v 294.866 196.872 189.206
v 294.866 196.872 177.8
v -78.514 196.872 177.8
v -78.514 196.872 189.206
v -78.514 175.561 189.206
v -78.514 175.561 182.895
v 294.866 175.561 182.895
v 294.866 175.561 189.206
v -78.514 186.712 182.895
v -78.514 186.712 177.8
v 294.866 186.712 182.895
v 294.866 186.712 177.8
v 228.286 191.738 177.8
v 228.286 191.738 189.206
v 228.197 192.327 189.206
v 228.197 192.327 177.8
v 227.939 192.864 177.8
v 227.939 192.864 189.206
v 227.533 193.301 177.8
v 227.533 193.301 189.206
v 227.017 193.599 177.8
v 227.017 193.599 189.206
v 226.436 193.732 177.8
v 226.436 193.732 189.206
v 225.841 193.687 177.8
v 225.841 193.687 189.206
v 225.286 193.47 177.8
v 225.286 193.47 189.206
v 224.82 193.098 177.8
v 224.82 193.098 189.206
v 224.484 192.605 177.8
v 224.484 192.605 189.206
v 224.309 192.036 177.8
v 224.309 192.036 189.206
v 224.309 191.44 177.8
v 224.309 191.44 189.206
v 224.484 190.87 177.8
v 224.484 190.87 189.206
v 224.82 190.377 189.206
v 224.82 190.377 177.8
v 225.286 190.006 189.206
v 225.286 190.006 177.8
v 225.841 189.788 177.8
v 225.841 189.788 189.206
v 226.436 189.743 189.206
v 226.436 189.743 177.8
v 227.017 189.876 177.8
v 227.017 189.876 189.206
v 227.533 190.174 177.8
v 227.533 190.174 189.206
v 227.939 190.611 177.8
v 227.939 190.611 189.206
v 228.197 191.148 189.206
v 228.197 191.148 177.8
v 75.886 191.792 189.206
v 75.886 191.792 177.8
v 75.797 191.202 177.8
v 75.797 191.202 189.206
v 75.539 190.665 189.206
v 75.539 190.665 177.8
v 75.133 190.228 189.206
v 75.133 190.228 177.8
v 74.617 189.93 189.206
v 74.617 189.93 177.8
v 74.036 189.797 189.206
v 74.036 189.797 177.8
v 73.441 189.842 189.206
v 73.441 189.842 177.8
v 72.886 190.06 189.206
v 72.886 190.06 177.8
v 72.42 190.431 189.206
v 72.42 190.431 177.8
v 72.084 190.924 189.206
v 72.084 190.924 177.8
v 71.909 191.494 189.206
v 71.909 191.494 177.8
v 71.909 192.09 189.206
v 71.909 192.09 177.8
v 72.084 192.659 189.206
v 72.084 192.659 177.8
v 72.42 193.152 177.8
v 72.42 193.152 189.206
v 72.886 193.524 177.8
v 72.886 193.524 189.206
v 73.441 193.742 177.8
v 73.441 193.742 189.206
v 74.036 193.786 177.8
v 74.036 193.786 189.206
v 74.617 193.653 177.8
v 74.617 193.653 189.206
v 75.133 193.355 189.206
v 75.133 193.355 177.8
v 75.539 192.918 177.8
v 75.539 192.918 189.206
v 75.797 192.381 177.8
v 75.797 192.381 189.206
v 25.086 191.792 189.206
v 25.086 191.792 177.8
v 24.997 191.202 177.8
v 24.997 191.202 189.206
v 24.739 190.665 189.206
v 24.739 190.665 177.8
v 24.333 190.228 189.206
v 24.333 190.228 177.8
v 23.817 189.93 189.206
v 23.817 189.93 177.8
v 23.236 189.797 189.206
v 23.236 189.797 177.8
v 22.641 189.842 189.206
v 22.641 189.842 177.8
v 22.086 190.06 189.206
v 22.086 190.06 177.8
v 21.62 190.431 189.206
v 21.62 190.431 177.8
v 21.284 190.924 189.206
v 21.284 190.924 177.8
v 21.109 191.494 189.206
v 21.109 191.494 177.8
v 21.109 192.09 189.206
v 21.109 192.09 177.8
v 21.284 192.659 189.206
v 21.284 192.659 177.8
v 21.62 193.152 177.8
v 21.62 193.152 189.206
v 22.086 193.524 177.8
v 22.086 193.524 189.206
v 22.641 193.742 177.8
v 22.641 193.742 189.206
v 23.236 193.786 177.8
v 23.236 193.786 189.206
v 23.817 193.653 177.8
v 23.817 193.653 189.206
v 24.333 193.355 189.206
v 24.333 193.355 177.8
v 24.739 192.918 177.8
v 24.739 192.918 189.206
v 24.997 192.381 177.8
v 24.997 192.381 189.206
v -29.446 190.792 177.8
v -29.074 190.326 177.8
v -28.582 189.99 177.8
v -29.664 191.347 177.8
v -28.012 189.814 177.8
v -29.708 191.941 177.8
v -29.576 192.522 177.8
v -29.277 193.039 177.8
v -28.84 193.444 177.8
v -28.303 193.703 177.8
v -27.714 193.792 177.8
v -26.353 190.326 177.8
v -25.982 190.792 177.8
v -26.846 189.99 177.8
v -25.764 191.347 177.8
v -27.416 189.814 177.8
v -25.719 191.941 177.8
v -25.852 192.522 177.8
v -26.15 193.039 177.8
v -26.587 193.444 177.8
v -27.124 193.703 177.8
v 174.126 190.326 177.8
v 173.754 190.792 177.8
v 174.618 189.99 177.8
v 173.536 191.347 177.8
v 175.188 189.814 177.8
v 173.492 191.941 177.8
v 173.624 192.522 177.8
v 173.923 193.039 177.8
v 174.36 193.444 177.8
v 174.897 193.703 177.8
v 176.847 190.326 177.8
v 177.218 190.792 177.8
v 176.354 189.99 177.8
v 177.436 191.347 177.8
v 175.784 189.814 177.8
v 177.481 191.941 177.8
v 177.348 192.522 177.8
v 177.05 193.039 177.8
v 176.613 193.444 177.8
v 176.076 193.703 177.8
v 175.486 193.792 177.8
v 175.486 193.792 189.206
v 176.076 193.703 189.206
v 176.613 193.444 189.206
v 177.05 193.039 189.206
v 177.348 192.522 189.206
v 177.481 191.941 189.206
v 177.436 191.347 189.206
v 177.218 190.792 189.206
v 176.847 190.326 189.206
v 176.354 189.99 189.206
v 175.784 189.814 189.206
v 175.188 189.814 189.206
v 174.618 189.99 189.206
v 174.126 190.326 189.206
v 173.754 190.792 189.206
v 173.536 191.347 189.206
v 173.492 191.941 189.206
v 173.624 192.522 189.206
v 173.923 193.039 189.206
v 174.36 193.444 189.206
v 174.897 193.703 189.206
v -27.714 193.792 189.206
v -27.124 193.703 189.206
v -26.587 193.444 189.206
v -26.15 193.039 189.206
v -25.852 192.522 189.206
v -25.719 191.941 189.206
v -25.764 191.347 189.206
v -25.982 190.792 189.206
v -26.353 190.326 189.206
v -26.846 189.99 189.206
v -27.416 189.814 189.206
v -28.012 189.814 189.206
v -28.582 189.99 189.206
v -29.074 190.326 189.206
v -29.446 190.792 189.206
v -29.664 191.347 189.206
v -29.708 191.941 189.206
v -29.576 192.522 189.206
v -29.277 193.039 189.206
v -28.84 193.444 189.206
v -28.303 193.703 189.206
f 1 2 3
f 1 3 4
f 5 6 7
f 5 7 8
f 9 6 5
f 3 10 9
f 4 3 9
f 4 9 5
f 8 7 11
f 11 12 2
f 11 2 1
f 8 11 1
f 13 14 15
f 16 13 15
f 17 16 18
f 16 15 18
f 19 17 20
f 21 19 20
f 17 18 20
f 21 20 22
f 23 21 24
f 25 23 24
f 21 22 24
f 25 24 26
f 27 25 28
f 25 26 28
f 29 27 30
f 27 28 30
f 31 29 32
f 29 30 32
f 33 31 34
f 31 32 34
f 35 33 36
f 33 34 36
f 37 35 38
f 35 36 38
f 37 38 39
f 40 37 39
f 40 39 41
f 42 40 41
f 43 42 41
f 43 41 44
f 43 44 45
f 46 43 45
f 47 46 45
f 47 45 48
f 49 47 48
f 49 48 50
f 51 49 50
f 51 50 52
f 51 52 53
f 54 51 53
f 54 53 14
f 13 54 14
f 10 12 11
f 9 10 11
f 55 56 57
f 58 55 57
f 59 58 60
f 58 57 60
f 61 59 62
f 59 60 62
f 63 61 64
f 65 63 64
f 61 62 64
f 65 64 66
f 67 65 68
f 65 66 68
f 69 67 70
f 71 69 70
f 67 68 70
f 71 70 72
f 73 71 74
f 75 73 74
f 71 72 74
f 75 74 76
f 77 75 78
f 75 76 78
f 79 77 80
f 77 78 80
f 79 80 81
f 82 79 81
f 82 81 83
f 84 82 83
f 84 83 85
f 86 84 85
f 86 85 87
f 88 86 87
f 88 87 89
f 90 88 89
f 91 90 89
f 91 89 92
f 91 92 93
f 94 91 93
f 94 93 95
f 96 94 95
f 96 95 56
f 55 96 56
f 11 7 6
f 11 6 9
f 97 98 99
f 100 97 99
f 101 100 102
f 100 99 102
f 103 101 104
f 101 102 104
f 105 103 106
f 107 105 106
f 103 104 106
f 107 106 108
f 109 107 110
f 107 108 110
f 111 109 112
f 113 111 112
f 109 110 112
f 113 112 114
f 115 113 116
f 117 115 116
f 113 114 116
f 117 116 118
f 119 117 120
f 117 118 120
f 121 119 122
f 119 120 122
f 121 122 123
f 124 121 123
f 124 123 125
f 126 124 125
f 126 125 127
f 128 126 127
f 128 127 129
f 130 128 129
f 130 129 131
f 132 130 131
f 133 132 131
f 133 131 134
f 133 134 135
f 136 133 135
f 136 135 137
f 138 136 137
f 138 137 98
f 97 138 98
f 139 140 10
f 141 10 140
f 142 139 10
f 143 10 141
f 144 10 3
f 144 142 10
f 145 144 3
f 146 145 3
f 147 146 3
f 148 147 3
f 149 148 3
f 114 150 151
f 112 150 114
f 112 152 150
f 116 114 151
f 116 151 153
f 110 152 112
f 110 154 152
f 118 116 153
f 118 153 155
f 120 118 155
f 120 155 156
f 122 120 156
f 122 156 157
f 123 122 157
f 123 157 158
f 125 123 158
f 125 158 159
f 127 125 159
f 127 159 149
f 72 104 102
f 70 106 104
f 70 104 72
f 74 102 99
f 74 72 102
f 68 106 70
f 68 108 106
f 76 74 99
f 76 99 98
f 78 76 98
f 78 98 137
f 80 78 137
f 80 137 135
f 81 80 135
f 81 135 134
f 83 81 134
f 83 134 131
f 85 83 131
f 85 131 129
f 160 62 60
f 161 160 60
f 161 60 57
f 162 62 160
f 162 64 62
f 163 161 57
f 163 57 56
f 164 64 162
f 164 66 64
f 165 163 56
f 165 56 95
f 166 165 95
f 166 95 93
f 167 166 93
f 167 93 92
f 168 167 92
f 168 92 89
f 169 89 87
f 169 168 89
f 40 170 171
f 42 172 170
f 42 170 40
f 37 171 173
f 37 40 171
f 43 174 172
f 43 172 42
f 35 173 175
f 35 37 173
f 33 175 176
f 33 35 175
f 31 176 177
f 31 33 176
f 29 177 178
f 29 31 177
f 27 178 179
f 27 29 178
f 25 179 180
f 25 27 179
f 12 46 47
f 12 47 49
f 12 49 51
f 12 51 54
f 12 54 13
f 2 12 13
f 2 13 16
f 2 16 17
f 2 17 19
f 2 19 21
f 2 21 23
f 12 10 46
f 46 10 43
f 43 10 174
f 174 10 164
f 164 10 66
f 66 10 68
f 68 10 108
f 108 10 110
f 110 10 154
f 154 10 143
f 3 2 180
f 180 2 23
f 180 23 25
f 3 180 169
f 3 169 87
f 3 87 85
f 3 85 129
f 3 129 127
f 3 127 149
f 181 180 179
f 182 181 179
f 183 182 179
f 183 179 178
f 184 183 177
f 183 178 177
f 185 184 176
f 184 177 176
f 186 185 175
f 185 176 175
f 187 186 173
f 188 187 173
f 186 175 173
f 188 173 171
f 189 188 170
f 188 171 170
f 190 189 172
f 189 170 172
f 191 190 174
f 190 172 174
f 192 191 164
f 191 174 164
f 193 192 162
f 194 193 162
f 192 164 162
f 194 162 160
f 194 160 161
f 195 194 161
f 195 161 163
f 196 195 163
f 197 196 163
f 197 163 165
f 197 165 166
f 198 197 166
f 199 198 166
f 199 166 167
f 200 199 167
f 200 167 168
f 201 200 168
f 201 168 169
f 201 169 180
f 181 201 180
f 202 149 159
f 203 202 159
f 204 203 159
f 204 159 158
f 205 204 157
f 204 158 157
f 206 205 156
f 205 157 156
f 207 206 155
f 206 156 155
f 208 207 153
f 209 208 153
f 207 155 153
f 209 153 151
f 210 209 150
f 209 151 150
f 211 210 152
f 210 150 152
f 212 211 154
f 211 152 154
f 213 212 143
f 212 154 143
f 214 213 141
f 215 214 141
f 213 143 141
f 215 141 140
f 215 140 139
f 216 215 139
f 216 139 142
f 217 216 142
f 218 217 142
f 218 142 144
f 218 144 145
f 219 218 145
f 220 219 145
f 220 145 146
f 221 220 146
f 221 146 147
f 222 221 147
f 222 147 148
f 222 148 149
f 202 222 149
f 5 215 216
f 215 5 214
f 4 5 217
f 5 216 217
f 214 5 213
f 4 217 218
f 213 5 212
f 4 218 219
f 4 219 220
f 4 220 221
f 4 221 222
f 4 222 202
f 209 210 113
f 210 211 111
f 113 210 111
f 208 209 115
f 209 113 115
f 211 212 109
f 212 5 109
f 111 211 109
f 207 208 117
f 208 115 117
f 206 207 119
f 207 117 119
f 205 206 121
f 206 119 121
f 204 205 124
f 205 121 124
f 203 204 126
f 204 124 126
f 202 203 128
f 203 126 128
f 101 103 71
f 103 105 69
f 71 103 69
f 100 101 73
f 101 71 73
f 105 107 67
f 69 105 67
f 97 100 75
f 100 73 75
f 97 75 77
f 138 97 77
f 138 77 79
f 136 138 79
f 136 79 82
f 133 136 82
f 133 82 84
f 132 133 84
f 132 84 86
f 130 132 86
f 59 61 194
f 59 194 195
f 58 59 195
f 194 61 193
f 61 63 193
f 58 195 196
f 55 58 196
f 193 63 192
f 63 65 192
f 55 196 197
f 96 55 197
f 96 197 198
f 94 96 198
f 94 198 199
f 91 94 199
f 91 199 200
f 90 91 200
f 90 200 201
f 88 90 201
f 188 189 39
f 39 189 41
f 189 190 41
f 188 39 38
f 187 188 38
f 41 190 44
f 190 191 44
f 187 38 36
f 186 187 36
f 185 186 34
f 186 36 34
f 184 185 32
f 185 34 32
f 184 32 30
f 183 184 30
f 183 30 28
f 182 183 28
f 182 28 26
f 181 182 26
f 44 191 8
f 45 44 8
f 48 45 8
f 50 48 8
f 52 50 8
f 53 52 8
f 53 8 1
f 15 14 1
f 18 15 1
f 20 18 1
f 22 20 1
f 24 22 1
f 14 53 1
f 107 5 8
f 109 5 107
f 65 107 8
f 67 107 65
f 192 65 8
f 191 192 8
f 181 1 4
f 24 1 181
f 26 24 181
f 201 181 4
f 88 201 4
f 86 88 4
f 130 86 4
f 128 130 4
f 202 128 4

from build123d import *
from build123d.topology import SkipClean

# Parameters (mm, degrees)
BOSS_EXTRUDE1_DEPTH     = 177.8
SKETCH2_R               = 6.35
BOSS_EXTRUDE2_DEPTH     = 3.175
CUT_EXTRUDE1_DEPTH      = 7.62
SKETCH4_R               = 35.56
CUT_EXTRUDE2_DEPTH      = 5.08
BOSS_EXTRUDE3_DEPTH     = 3.175
BOSS_EXTRUDE4_START     = -3.175
BOSS_EXTRUDE4_DEPTH     = 3.175
SKETCH2_3_R             = 6.35
CUT_EXTRUDE3_DEPTH      = 203.2
SKETCH7_W               = 104.303861479
SKETCH7_H               = 17.78
CUT_EXTRUDE4_DEPTH      = 7.62
SKETCH9_W               = 5.09491902
SKETCH9_H               = 10.16
BOSS_EXTRUDE5_DEPTH     = 373.38
SKETCH10_W              = 16.389929124
SKETCH10_H              = 55.852942909
CUT_EXTRUDE5_DEPTH      = 50.8
SKETCH11_W              = 37.311204657
SKETCH11_H              = 70.036499624
CUT_EXTRUDE6_DEPTH      = 63.5
CUT_EXTRUDE_THIN3_DEPTH = 1.27
BOSS_EXTRUDE6_DEPTH     = 1.27
BOSS_EXTRUDE6_2_DEPTH   = 1.27
BOSS_EXTRUDE6_3_DEPTH   = 1.27
BOSS_EXTRUDE6_4_DEPTH   = 1.27
SKETCH14_R              = 6.35
CUT_EXTRUDE7_DEPTH      = 6.35
SKETCH15_R              = 6.35
CUT_EXTRUDE8_DEPTH      = 6.35
SKETCH16_R              = 2
CUT_EXTRUDE9_DEPTH      = 203.2
SKETCH17_R              = 2
CUT_EXTRUDE10_DEPTH     = 50.8
CUT_EXTRUDE11_DEPTH     = 50.8
CUT_EXTRUDE12_DEPTH     = 135.636
SKETCH20_W              = 88.9
SKETCH20_H              = 19.05
CUT_EXTRUDE13_DEPTH     = 25.4
SKETCH22_W              = 88.9
SKETCH22_H              = 19.05
CUT_EXTRUDE14_DEPTH     = 25.4
CUT_EXTRUDE15_DEPTH     = 12.7
SKETCH24_R              = 1.5
CUT_EXTRUDE16_DEPTH     = 12.7
SKETCH25_W              = 262.331886811
SKETCH25_H              = 349.210695903
CUT_EXTRUDE17_DEPTH     = 381


with BuildPart() as part:
    # Sketch1 → Boss-Extrude1 (new body)
    with BuildSketch(Plane.XY):
        Polygon((174.206706958, 205.225588808), (176.700980282, 203.057350086), (6.59291173, 7.37040221), (4.098638405, 9.538640932), align=None)
        Polygon((176.700980282, 203.057350086), (176.700980282, 207.584488047), (174.206706958, 205.225588808), align=None)
        Polygon((176.700980282, 203.057350086), (176.700980282, 207.584488047), (294.86623267, 79.97762329), (292.609334988, 77.887713122), align=None)
        Polygon((176.700980282, 203.057350086), (6.59291173, 7.37040221), (11.706315855, 7.37040221), (176.700980282, 197.43083223), align=None)
        Polygon((292.609334988, 77.887713122), (179.222024463, 200.334870023), (176.700980282, 197.43083223), (289.802992908, 75.306026972), align=None)
        Polygon((179.222024463, 200.334870023), (176.700980282, 203.057350086), (176.700980282, 197.43083223), align=None)
    extrude(amount=BOSS_EXTRUDE1_DEPTH)

    # Sketch2 → Boss-Extrude2 (add)
    with BuildSketch(Plane(origin=(0, 0, 0), x_dir=(-1, 0, 0), z_dir=(0, 0, -1))):
        Polygon((-176.700980282, 207.584488047), (-294.86623267, 79.97762329), (-294.86623267, 308.57762329), (-4.03623267, 308.57762329), (-4.03623267, 9.466851346), align=None)
        with Locations((-109.551832016, 215.6073789)):
            Circle(SKETCH2_R, mode=Mode.SUBTRACT)
        with Locations((-50.099162461, 143.63835786)):
            Circle(SKETCH2_R, mode=Mode.SUBTRACT)
    boss_extrude2 = extrude(amount=-BOSS_EXTRUDE2_DEPTH)

    # Mirror1: Boss-Extrude2 across plane
    add(boss_extrude2.mirror(Plane.XY.offset(88.9)))

    # Sketch3 → Cut-Extrude1 (cut)
    with BuildSketch(Plane(origin=(-2.388376456, 2.076183978, 0), x_dir=(0.6560590289905027, 0.754709580222776, 0), z_dir=(-0.754709580222776, 0.6560590289905027, 0))):
        Polygon((146.938003774, -3.175), (147.021985505, -88.9), (210.43489334, -88.9), (210.43489334, -3.175), align=None)
        Polygon((210.43489334, -88.9), (147.021985505, -88.9), (147.047852426, -115.303859178), (210.43489334, -115.303859178), align=None)
    extrude(amount=-CUT_EXTRUDE1_DEPTH, mode=Mode.SUBTRACT)

    # Sketch4 → Cut-Extrude2 (cut)
    with BuildSketch(Plane.XY.offset(3.175)):
        with Locations((115.138547862, 136.94700246)):
            Circle(SKETCH4_R)
    extrude(amount=-CUT_EXTRUDE2_DEPTH, mode=Mode.SUBTRACT)

    # Sketch5 → Boss-Extrude3 (add)
    with BuildSketch(Plane(origin=(0, 0, 0), x_dir=(-1, 0, 0), z_dir=(0, 0, -1))):
        with BuildLine():
            Line((23.718677813, 87.809342908), (-4.03623267, 87.809342908))
            Line((-4.03623267, 87.809342908), (-4.03623267, 68.97229904))
            ThreePointArc((-4.03623267, 68.97229904), (2.710389506, 69.812621892), (6.35, 64.070123417))
            ThreePointArc((6.35, 64.070123417), (2.710389506, 58.327624943), (-4.03623267, 59.167947795))
            Line((-4.03623267, 59.167947795), (-4.03623267, 41.258157594))
            Line((-4.03623267, 41.258157594), (23.718677813, 41.258157594))
            Line((23.718677813, 41.258157594), (23.718677813, 87.809342908))
        make_face()
    extrude(amount=-BOSS_EXTRUDE3_DEPTH)

    # Sketch6 → Boss-Extrude4 (add)
    with BuildSketch(Plane.XY.offset(177.8).offset(BOSS_EXTRUDE4_START)):
        with BuildLine():
            Line((4.03623267, 68.97229904), (4.03623267, 87.809342908))
            Line((4.03623267, 87.809342908), (-23.718677813, 87.809342908))
            Line((-23.718677813, 87.809342908), (-23.718677813, 41.258157594))
            Line((-23.718677813, 41.258157594), (4.03623267, 41.258157594))
            Line((4.03623267, 41.258157594), (4.03623267, 59.167947795))
            ThreePointArc((4.03623267, 59.167947795), (-6.35, 64.070123417), (4.03623267, 68.97229904))
        make_face()
    extrude(amount=BOSS_EXTRUDE4_DEPTH)

    # Sketch2<3> → Cut-Extrude3 (cut)
    with SkipClean():  # the faces are left unmerged after this step: merging them gives an invalid solid
        with BuildSketch(Plane(origin=(0, 0, 0), x_dir=(-1, 0, 0), z_dir=(0, 0, -1))):
            with Locations((0, 64.070123417)):
                Circle(SKETCH2_3_R)
        extrude(amount=-CUT_EXTRUDE3_DEPTH, mode=Mode.SUBTRACT)

    # Sketch7 → Cut-Extrude4 (cut)
    with SkipClean():  # the faces are left unmerged after this step: merging them gives an invalid solid
        with BuildSketch(Plane(origin=(198.614996443, 183.919503291, 0), x_dir=(0, 0, -1), z_dir=(0.7337298645028701, 0.6794413042615234, 0))):
            with Locations((-88.799310538, -132.772327008)):
                Rectangle(SKETCH7_W, SKETCH7_H)
        extrude(amount=-CUT_EXTRUDE4_DEPTH, mode=Mode.SUBTRACT)

    # Sketch9 → Boss-Extrude5 (add)
    with SkipClean():  # the faces are left unmerged after this step: merging them gives an invalid solid
        with BuildSketch(Plane(origin=(294.86623267, 0, 0), x_dir=(0, 0, -1), z_dir=(1, 0, 0))):
            with Locations((2.54745951, 191.791667894)):
                Rectangle(SKETCH9_W, SKETCH9_H)
            Polygon((5.09491902, 196.871667894), (5.09491902, 186.711667894), (5.09491902, 175.560674011), (11.405822058, 175.560674011), (11.405822058, 196.871667894), align=None)
        boss_extrude5 = extrude(amount=-BOSS_EXTRUDE5_DEPTH)

    # Mirror2: Boss-Extrude5 across plane
    with SkipClean():  # the faces are left unmerged after this step: merging them gives an invalid solid
        add(boss_extrude5.mirror(Plane.XY.offset(88.9)))

    # Sketch10 → Cut-Extrude5 (cut)
    with SkipClean():  # the faces are left unmerged after this step: merging them gives an invalid solid
        with BuildSketch(Plane(origin=(294.86623267, 0, 0), x_dir=(0, 0, -1), z_dir=(1, 0, 0))):
            with Locations((8.194964562, 177.809205996)):
                Rectangle(SKETCH10_W, SKETCH10_H)
        extrude(amount=-CUT_EXTRUDE5_DEPTH, mode=Mode.SUBTRACT)

    # Sketch11 → Cut-Extrude6 (cut)
    with SkipClean():  # the faces are left unmerged after this step: merging them gives an invalid solid
        with BuildSketch(Plane(origin=(0, 0, 0), x_dir=(-1, 0, 0), z_dir=(0, 0, -1))):
            with Locations((-276.210630342, 174.143668429)):
                Rectangle(SKETCH11_W, SKETCH11_H)
        extrude(amount=-CUT_EXTRUDE6_DEPTH, mode=Mode.SUBTRACT)

    # Sketch12 → Cut-Extrude-Thin3 (cut)
    with SkipClean():  # the faces are left unmerged after this step: merging them gives an invalid solid
        with BuildSketch(Plane(origin=(198.614996443, 183.919503291, 0), x_dir=(0, 0, -1), z_dir=(0.7337298645028701, 0.6794413042615234, 0))):
            Polygon((-171.532951818, 28.022585612), (-143.20199229, -115.162103868), (-139.962790584, -114.521185535), (-168.293750113, 28.663503944), align=None)
            Polygon((-33.454545449, -115.162103868), (-6.228065693, 28.022585612), (-9.471942339, 28.639406741), (-36.698422095, -114.545282739), align=None)
        extrude(amount=-CUT_EXTRUDE_THIN3_DEPTH, mode=Mode.SUBTRACT)

    # Sketch14 → Cut-Extrude7 (cut)
    with SkipClean():  # the faces are left unmerged after this step: merging them gives an invalid solid
        with BuildSketch(Plane.XY.offset(3.175)):
            with Locations((25.62623267, 167.726388192)):
                Circle(SKETCH14_R)
        extrude(amount=-CUT_EXTRUDE7_DEPTH, mode=Mode.SUBTRACT)

    # Sketch15 → Cut-Extrude8 (cut)
    with SkipClean():  # the faces are left unmerged after this step: merging them gives an invalid solid
        with BuildSketch(Plane.XY.offset(177.8)):
            with Locations((25.62623267, 167.726388192)):
                Circle(SKETCH15_R)
        extrude(amount=-CUT_EXTRUDE8_DEPTH, mode=Mode.SUBTRACT)

    # Sketch16 → Cut-Extrude9 (cut)
    with SkipClean():  # the faces are left unmerged after this step: merging them gives an invalid solid
        with BuildSketch(Plane(origin=(0, 0, -11.405822058), x_dir=(-1, 0, 0), z_dir=(0, 0, -1))):
            with Locations(Location((-175.48623267, 191.791667894, 0), (0, 0, 90))):
                Circle(SKETCH16_R)
            with Locations(Location((-73.88623267, 191.791667894, 0), (0, 0, 180))):
                Circle(SKETCH16_R)
            with Locations(Location((-23.08623267, 191.791667894, 0), (0, 0, 180))):
                Circle(SKETCH16_R)
            with Locations(Location((27.71376733, 191.791667894, 0), (0, 0, 90))):
                Circle(SKETCH16_R)
        extrude(amount=-CUT_EXTRUDE9_DEPTH, mode=Mode.SUBTRACT)

    # Sketch17 → Cut-Extrude10 (cut)
    with SkipClean():  # the faces are left unmerged after this step: merging them gives an invalid solid
        with BuildSketch(Plane.XY.offset(189.205822058)):
            with Locations((226.28623267, 191.73762329)):
                Circle(SKETCH17_R)
        extrude(amount=-CUT_EXTRUDE10_DEPTH, mode=Mode.SUBTRACT)

    # Sketch18 → Cut-Extrude11 (cut)
    with SkipClean():  # the faces are left unmerged after this step: merging them gives an invalid solid
        with BuildSketch(Plane(origin=(198.614996443, 183.919503291, 0), x_dir=(0, 0, -1), z_dir=(0.7337298645028701, 0.6794413042615234, 0))):
            Polygon((-170.82495725, -33.509501551), (-170.82495725, -115.912858784), (-148.021512482, -115.912858784), (-165.124096058, -33.509501551), align=None)
        extrude(amount=-CUT_EXTRUDE11_DEPTH, mode=Mode.SUBTRACT)

    # Sketch19 → Cut-Extrude12 (cut)
    with SkipClean():  # the faces are left unmerged after this step: merging them gives an invalid solid
        with BuildSketch(Plane(origin=(198.614996443, 183.919503291, 0), x_dir=(0, 0, -1), z_dir=(0.7337298645028701, 0.6794413042615234, 0))):
            Polygon((-27.790980507, -115.912858784), (-12.83560064, -35.35545082), (-7.206169917, -35.35545082), (-7.206169917, -115.912858784), align=None)
        extrude(amount=-CUT_EXTRUDE12_DEPTH, mode=Mode.SUBTRACT)

    # Sketch20 → Cut-Extrude13 (cut)
    with SkipClean():  # the faces are left unmerged after this step: merging them gives an invalid solid
        with BuildSketch(Plane.XY.offset(177.8)):
            with BuildLine():
                Line((162.857920191, 291.02562329), (162.857920191, 292.57562329))
                Line((162.857920191, 292.57562329), (164.407920191, 292.57562329))
                ThreePointArc((164.407920191, 292.57562329), (161.76190468, 293.671638801), (162.857920191, 291.02562329))
            make_face()
            with BuildLine():
                Line((164.407920191, 292.57562329), (162.857920191, 292.57562329))
                Line((162.857920191, 292.57562329), (162.857920191, 291.02562329))
                ThreePointArc((162.857920191, 291.02562329), (163.953935702, 291.479607779), (164.407920191, 292.57562329))
            make_face()
            with BuildLine():
                ThreePointArc((266.007920191, 292.57562329), (264.457920191, 294.12562329), (262.907920191, 292.57562329))
                Line((262.907920191, 292.57562329), (264.457920191, 292.57562329))
                Line((264.457920191, 292.57562329), (264.457920191, 291.02562329))
                ThreePointArc((264.457920191, 291.02562329), (265.553935702, 291.479607779), (266.007920191, 292.57562329))
            make_face()
            with BuildLine():
                Line((264.457920191, 292.57562329), (262.907920191, 292.57562329))
                ThreePointArc((262.907920191, 292.57562329), (263.36190468, 291.479607779), (264.457920191, 291.02562329))
                Line((264.457920191, 291.02562329), (264.457920191, 292.57562329))
            make_face()
            with BuildLine():
                ThreePointArc((164.407920191, 241.77562329), (163.953935702, 242.871638801), (162.857920191, 243.32562329))
                Line((162.857920191, 243.32562329), (162.857920191, 241.77562329))
                Line((162.857920191, 241.77562329), (164.407920191, 241.77562329))
            make_face()
            with BuildLine():
                Line((162.857920191, 241.77562329), (162.857920191, 243.32562329))
                ThreePointArc((162.857920191, 243.32562329), (161.76190468, 240.679607779), (164.407920191, 241.77562329))
                Line((164.407920191, 241.77562329), (162.857920191, 241.77562329))
            make_face()
            with BuildLine():
                ThreePointArc((266.007920191, 241.77562329), (265.553935702, 242.871638801), (264.457920191, 243.32562329))
                Line((264.457920191, 243.32562329), (264.457920191, 241.77562329))
                Line((264.457920191, 241.77562329), (262.907920191, 241.77562329))
                ThreePointArc((262.907920191, 241.77562329), (264.457920191, 240.22562329), (266.007920191, 241.77562329))
            make_face()
            with BuildLine():
                Line((264.457920191, 241.77562329), (264.457920191, 243.32562329))
                ThreePointArc((264.457920191, 243.32562329), (263.36190468, 242.871638801), (262.907920191, 241.77562329))
                Line((262.907920191, 241.77562329), (264.457920191, 241.77562329))
            make_face()
            with Locations((213.657920191, 282.969686208)):
                Rectangle(SKETCH20_W, SKETCH20_H)
        extrude(amount=-CUT_EXTRUDE13_DEPTH, mode=Mode.SUBTRACT)

    # Sketch22 → Cut-Extrude14 (cut)
    with SkipClean():  # the faces are left unmerged after this step: merging them gives an invalid solid
        with BuildSketch(Plane(origin=(0, 0, 0), x_dir=(-1, 0, 0), z_dir=(0, 0, -1))):
            with BuildLine():
                Line((-264.581570713, 291.02562329), (-264.581570713, 292.57562329))
                Line((-264.581570713, 292.57562329), (-263.031570713, 292.57562329))
                ThreePointArc((-263.031570713, 292.57562329), (-265.677586224, 293.671638801), (-264.581570713, 291.02562329))
            make_face()
            with BuildLine():
                Line((-263.031570713, 292.57562329), (-264.581570713, 292.57562329))
                Line((-264.581570713, 292.57562329), (-264.581570713, 291.02562329))
                ThreePointArc((-264.581570713, 291.02562329), (-263.485555202, 291.479607779), (-263.031570713, 292.57562329))
            make_face()
            with BuildLine():
                ThreePointArc((-263.031570713, 241.77562329), (-263.485555202, 242.871638801), (-264.581570713, 243.32562329))
                Line((-264.581570713, 243.32562329), (-264.581570713, 241.77562329))
                Line((-264.581570713, 241.77562329), (-263.031570713, 241.77562329))
            make_face()
            with BuildLine():
                Line((-264.581570713, 241.77562329), (-264.581570713, 243.32562329))
                ThreePointArc((-264.581570713, 243.32562329), (-265.677586224, 240.679607779), (-263.031570713, 241.77562329))
                Line((-263.031570713, 241.77562329), (-264.581570713, 241.77562329))
            make_face()
            with BuildLine():
                ThreePointArc((-161.431570713, 292.57562329), (-162.981570713, 294.12562329), (-164.531570713, 292.57562329))
                Line((-164.531570713, 292.57562329), (-162.981570713, 292.57562329))
                Line((-162.981570713, 292.57562329), (-162.981570713, 291.02562329))
                ThreePointArc((-162.981570713, 291.02562329), (-161.885555202, 291.479607779), (-161.431570713, 292.57562329))
            make_face()
            with BuildLine():
                Line((-162.981570713, 292.57562329), (-164.531570713, 292.57562329))
                ThreePointArc((-164.531570713, 292.57562329), (-164.077586224, 291.479607779), (-162.981570713, 291.02562329))
                Line((-162.981570713, 291.02562329), (-162.981570713, 292.57562329))
            make_face()
            with BuildLine():
                ThreePointArc((-161.431570713, 241.77562329), (-161.885555202, 242.871638801), (-162.981570713, 243.32562329))
                Line((-162.981570713, 243.32562329), (-162.981570713, 241.77562329))
                Line((-162.981570713, 241.77562329), (-164.531570713, 241.77562329))
                ThreePointArc((-164.531570713, 241.77562329), (-162.981570713, 240.22562329), (-161.431570713, 241.77562329))
            make_face()
            with BuildLine():
                Line((-162.981570713, 241.77562329), (-162.981570713, 243.32562329))
                ThreePointArc((-162.981570713, 243.32562329), (-164.077586224, 242.871638801), (-164.531570713, 241.77562329))
                Line((-164.531570713, 241.77562329), (-162.981570713, 241.77562329))
            make_face()
            with Locations((-213.781570713, 283.028383525)):
                Rectangle(SKETCH22_W, SKETCH22_H)
        extrude(amount=-CUT_EXTRUDE14_DEPTH, mode=Mode.SUBTRACT)

    # Sketch23 → Cut-Extrude15 (cut)
    with SkipClean():  # the faces are left unmerged after this step: merging them gives an invalid solid
        with BuildSketch(Plane(origin=(0, 0, 0), x_dir=(-1, 0, 0), z_dir=(0, 0, -1))):
            with BuildLine():
                ThreePointArc((-281.46966057, 89.27791623), (-283.589396682, 89.195947845), (-283.507428297, 87.076211733))
                Line((-283.507428297, 87.076211733), (-281.46966057, 89.27791623))
            make_face()
            with BuildLine():
                Line((-281.46966057, 89.27791623), (-283.507428297, 87.076211733))
                ThreePointArc((-283.507428297, 87.076211733), (-281.887847254, 86.802595758), (-280.988544434, 88.177063981))
                ThreePointArc((-280.988544434, 88.177063981), (-281.11407621, 88.777761162), (-281.46966057, 89.27791623))
            make_face()
            with BuildLine():
                ThreePointArc((-261.677113571, 110.662757672), (-263.796849683, 110.580789287), (-263.714881298, 108.461053175))
                Line((-263.714881298, 108.461053175), (-261.677113571, 110.662757672))
            make_face()
            with BuildLine():
                Line((-261.677113571, 110.662757672), (-263.714881298, 108.461053175))
                ThreePointArc((-263.714881298, 108.461053175), (-262.095300254, 108.1874372), (-261.195997434, 109.561905424))
                ThreePointArc((-261.195997434, 109.561905424), (-261.321529211, 110.162602604), (-261.677113571, 110.662757672))
            make_face()
            with BuildLine():
                ThreePointArc((-242.471013434, 131.413973074), (-244.590749546, 131.332004689), (-244.508781161, 129.212268577))
                Line((-244.508781161, 129.212268577), (-242.471013434, 131.413973074))
            make_face()
            with BuildLine():
                Line((-242.471013434, 131.413973074), (-244.508781161, 129.212268577))
                ThreePointArc((-244.508781161, 129.212268577), (-242.889200117, 128.938652602), (-241.989897298, 130.313120826))
                ThreePointArc((-241.989897298, 130.313120826), (-242.115429074, 130.913818006), (-242.471013434, 131.413973074))
            make_face()
            with BuildLine():
                ThreePointArc((-221.219107983, 154.375577179), (-223.338844094, 154.293608794), (-223.256875709, 152.173872682))
                Line((-223.256875709, 152.173872682), (-221.219107983, 154.375577179))
            make_face()
            with BuildLine():
                Line((-221.219107983, 154.375577179), (-223.256875709, 152.173872682))
                ThreePointArc((-223.256875709, 152.173872682), (-221.637294666, 151.900256707), (-220.737991846, 153.274724931))
                ThreePointArc((-220.737991846, 153.274724931), (-220.863523622, 153.875422111), (-221.219107983, 154.375577179))
            make_face()
            with BuildLine():
                ThreePointArc((-145.886078234, 168.131923716), (-146.764955289, 169.497283115), (-148.371686616, 169.262665118))
                Line((-148.371686616, 169.262665118), (-146.400469852, 167.001182315))
                ThreePointArc((-146.400469852, 167.001182315), (-146.020718836, 167.510800771), (-145.886078234, 168.131923716))
            make_face()
            with BuildLine():
                Line((-146.400469852, 167.001182315), (-148.371686616, 169.262665118))
                ThreePointArc((-148.371686616, 169.262665118), (-148.516819636, 167.146315334), (-146.400469852, 167.001182315))
            make_face()
            with BuildLine():
                ThreePointArc((-49.387047149, 57.423196347), (-50.265924204, 58.788555745), (-51.872655531, 58.553937749))
                Line((-51.872655531, 58.553937749), (-49.901438767, 56.292454945))
                ThreePointArc((-49.901438767, 56.292454945), (-49.521687751, 56.802073401), (-49.387047149, 57.423196347))
            make_face()
            with BuildLine():
                Line((-49.901438767, 56.292454945), (-51.872655531, 58.553937749))
                ThreePointArc((-51.872655531, 58.553937749), (-52.017788551, 56.437587965), (-49.901438767, 56.292454945))
            make_face()
            with BuildLine():
                ThreePointArc((-31.668427664, 37.095470857), (-32.547304719, 38.460830256), (-34.154036046, 38.226212259))
                Line((-34.154036046, 38.226212259), (-32.182819282, 35.964729456))
                ThreePointArc((-32.182819282, 35.964729456), (-31.803068266, 36.474347912), (-31.668427664, 37.095470857))
            make_face()
            with BuildLine():
                Line((-32.182819282, 35.964729456), (-34.154036046, 38.226212259))
                ThreePointArc((-34.154036046, 38.226212259), (-34.299169066, 36.109862475), (-32.182819282, 35.964729456))
            make_face()
            with BuildLine():
                ThreePointArc((-16.066850555, 19.196526928), (-16.94572761, 20.561886326), (-18.552458937, 20.327268329))
                Line((-18.552458937, 20.327268329), (-16.581242173, 18.065785526))
                ThreePointArc((-16.581242173, 18.065785526), (-16.201491157, 18.575403982), (-16.066850555, 19.196526928))
            make_face()
            with BuildLine():
                Line((-16.581242173, 18.065785526), (-18.552458937, 20.327268329))
                ThreePointArc((-18.552458937, 20.327268329), (-18.697591957, 18.210918546), (-16.581242173, 18.065785526))
            make_face()
        extrude(amount=-CUT_EXTRUDE15_DEPTH, mode=Mode.SUBTRACT)

    # Sketch24 → Cut-Extrude16 (cut)
    with SkipClean():  # the faces are left unmerged after this step: merging them gives an invalid solid
        with BuildSketch(Plane.XY.offset(177.8)):
            with Locations((277.221839581, 93.68533948)):
                Circle(SKETCH24_R)
            with Locations((256.088046252, 116.620130178)):
                Circle(SKETCH24_R)
            with Locations((233.352788284, 141.292860476)):
                Circle(SKETCH24_R)
            with Locations((211.758500856, 164.727388047)):
                Circle(SKETCH24_R)
            with Locations((135.020648746, 154.397680008)):
                Circle(SKETCH24_R)
            with Locations((113.672052573, 129.804959434)):
                Circle(SKETCH24_R)
            with Locations((89.546525068, 102.013326118)):
                Circle(SKETCH24_R)
            with Locations((62.67652141, 71.060167118)):
                Circle(SKETCH24_R)
            with Locations((39.522371339, 44.387521375)):
                Circle(SKETCH24_R)
        extrude(amount=-CUT_EXTRUDE16_DEPTH, mode=Mode.SUBTRACT)


with BuildPart() as body_2:
    # Sketch13 → Boss-Extrude6 (new body)
    with BuildSketch(Plane(origin=(198.614996443, 183.919503291, 0), x_dir=(0, 0, -1), z_dir=(0.7337298645028701, 0.6794413042615234, 0))):
        Polygon((-171.532951818, 28.022585612), (-171.375187306, 27.225243654), (-168.293750113, 28.663503944), align=None)
    extrude(amount=-BOSS_EXTRUDE6_DEPTH)


with BuildPart() as body_3:
    # Sketch13 → Boss-Extrude6 2 (new body)
    with BuildSketch(Plane(origin=(198.614996443, 183.919503291, 0), x_dir=(0, 0, -1), z_dir=(0.7337298645028701, 0.6794413042615234, 0))):
        Polygon((-143.20199229, -115.162103868), (-140.120555097, -113.723843577), (-139.962790584, -114.521185535), align=None)
    extrude(amount=-BOSS_EXTRUDE6_2_DEPTH)


with BuildPart() as body_4:
    # Sketch13 → Boss-Extrude6 3 (new body)
    with BuildSketch(Plane(origin=(198.614996443, 183.919503291, 0), x_dir=(0, 0, -1), z_dir=(0.7337298645028701, 0.6794413042615234, 0))):
        Polygon((-9.471942339, 28.639406741), (-6.382619108, 27.209785612), (-6.228065693, 28.022585612), align=None)
    extrude(amount=-BOSS_EXTRUDE6_3_DEPTH)


with BuildPart() as body_5:
    # Sketch13 → Boss-Extrude6 4 (new body)
    with BuildSketch(Plane(origin=(198.614996443, 183.919503291, 0), x_dir=(0, 0, -1), z_dir=(0.7337298645028701, 0.6794413042615234, 0))):
        Polygon((-36.698422095, -114.545282739), (-33.302712556, -114.363611155), (-33.454545449, -115.162103868), align=None)
    extrude(amount=-BOSS_EXTRUDE6_4_DEPTH)


with BuildPart() as cut_extrude17_tool:
    # Sketch25 → Cut-Extrude17 (new body)
    with BuildSketch(Plane(origin=(294.86623267, 0, 0), x_dir=(0, 0, -1), z_dir=(1, 0, 0))):
        with Locations((-46.634056595, 133.972275338)):
            Rectangle(SKETCH25_W, SKETCH25_H)
    extrude(amount=-CUT_EXTRUDE17_DEPTH)


with BuildPart() as part_1:
    add(part.part)

    # Cut-Extrude17: cut by cut_extrude17_tool
    add(cut_extrude17_tool.part, mode=Mode.SUBTRACT)


with BuildPart() as body_2_1:
    add(body_2.part)

    # Cut-Extrude17: cut by cut_extrude17_tool
    add(cut_extrude17_tool.part, mode=Mode.SUBTRACT)


with BuildPart() as body_3_1:
    add(body_3.part)

    # Cut-Extrude17: cut by cut_extrude17_tool
    add(cut_extrude17_tool.part, mode=Mode.SUBTRACT)


with BuildPart() as body_4_1:
    add(body_4.part)

    # Cut-Extrude17: cut by cut_extrude17_tool
    add(cut_extrude17_tool.part, mode=Mode.SUBTRACT)


with BuildPart() as body_5_1:
    add(body_5.part)

    # Cut-Extrude17: cut by cut_extrude17_tool
    add(cut_extrude17_tool.part, mode=Mode.SUBTRACT)


solid = part_1.part
